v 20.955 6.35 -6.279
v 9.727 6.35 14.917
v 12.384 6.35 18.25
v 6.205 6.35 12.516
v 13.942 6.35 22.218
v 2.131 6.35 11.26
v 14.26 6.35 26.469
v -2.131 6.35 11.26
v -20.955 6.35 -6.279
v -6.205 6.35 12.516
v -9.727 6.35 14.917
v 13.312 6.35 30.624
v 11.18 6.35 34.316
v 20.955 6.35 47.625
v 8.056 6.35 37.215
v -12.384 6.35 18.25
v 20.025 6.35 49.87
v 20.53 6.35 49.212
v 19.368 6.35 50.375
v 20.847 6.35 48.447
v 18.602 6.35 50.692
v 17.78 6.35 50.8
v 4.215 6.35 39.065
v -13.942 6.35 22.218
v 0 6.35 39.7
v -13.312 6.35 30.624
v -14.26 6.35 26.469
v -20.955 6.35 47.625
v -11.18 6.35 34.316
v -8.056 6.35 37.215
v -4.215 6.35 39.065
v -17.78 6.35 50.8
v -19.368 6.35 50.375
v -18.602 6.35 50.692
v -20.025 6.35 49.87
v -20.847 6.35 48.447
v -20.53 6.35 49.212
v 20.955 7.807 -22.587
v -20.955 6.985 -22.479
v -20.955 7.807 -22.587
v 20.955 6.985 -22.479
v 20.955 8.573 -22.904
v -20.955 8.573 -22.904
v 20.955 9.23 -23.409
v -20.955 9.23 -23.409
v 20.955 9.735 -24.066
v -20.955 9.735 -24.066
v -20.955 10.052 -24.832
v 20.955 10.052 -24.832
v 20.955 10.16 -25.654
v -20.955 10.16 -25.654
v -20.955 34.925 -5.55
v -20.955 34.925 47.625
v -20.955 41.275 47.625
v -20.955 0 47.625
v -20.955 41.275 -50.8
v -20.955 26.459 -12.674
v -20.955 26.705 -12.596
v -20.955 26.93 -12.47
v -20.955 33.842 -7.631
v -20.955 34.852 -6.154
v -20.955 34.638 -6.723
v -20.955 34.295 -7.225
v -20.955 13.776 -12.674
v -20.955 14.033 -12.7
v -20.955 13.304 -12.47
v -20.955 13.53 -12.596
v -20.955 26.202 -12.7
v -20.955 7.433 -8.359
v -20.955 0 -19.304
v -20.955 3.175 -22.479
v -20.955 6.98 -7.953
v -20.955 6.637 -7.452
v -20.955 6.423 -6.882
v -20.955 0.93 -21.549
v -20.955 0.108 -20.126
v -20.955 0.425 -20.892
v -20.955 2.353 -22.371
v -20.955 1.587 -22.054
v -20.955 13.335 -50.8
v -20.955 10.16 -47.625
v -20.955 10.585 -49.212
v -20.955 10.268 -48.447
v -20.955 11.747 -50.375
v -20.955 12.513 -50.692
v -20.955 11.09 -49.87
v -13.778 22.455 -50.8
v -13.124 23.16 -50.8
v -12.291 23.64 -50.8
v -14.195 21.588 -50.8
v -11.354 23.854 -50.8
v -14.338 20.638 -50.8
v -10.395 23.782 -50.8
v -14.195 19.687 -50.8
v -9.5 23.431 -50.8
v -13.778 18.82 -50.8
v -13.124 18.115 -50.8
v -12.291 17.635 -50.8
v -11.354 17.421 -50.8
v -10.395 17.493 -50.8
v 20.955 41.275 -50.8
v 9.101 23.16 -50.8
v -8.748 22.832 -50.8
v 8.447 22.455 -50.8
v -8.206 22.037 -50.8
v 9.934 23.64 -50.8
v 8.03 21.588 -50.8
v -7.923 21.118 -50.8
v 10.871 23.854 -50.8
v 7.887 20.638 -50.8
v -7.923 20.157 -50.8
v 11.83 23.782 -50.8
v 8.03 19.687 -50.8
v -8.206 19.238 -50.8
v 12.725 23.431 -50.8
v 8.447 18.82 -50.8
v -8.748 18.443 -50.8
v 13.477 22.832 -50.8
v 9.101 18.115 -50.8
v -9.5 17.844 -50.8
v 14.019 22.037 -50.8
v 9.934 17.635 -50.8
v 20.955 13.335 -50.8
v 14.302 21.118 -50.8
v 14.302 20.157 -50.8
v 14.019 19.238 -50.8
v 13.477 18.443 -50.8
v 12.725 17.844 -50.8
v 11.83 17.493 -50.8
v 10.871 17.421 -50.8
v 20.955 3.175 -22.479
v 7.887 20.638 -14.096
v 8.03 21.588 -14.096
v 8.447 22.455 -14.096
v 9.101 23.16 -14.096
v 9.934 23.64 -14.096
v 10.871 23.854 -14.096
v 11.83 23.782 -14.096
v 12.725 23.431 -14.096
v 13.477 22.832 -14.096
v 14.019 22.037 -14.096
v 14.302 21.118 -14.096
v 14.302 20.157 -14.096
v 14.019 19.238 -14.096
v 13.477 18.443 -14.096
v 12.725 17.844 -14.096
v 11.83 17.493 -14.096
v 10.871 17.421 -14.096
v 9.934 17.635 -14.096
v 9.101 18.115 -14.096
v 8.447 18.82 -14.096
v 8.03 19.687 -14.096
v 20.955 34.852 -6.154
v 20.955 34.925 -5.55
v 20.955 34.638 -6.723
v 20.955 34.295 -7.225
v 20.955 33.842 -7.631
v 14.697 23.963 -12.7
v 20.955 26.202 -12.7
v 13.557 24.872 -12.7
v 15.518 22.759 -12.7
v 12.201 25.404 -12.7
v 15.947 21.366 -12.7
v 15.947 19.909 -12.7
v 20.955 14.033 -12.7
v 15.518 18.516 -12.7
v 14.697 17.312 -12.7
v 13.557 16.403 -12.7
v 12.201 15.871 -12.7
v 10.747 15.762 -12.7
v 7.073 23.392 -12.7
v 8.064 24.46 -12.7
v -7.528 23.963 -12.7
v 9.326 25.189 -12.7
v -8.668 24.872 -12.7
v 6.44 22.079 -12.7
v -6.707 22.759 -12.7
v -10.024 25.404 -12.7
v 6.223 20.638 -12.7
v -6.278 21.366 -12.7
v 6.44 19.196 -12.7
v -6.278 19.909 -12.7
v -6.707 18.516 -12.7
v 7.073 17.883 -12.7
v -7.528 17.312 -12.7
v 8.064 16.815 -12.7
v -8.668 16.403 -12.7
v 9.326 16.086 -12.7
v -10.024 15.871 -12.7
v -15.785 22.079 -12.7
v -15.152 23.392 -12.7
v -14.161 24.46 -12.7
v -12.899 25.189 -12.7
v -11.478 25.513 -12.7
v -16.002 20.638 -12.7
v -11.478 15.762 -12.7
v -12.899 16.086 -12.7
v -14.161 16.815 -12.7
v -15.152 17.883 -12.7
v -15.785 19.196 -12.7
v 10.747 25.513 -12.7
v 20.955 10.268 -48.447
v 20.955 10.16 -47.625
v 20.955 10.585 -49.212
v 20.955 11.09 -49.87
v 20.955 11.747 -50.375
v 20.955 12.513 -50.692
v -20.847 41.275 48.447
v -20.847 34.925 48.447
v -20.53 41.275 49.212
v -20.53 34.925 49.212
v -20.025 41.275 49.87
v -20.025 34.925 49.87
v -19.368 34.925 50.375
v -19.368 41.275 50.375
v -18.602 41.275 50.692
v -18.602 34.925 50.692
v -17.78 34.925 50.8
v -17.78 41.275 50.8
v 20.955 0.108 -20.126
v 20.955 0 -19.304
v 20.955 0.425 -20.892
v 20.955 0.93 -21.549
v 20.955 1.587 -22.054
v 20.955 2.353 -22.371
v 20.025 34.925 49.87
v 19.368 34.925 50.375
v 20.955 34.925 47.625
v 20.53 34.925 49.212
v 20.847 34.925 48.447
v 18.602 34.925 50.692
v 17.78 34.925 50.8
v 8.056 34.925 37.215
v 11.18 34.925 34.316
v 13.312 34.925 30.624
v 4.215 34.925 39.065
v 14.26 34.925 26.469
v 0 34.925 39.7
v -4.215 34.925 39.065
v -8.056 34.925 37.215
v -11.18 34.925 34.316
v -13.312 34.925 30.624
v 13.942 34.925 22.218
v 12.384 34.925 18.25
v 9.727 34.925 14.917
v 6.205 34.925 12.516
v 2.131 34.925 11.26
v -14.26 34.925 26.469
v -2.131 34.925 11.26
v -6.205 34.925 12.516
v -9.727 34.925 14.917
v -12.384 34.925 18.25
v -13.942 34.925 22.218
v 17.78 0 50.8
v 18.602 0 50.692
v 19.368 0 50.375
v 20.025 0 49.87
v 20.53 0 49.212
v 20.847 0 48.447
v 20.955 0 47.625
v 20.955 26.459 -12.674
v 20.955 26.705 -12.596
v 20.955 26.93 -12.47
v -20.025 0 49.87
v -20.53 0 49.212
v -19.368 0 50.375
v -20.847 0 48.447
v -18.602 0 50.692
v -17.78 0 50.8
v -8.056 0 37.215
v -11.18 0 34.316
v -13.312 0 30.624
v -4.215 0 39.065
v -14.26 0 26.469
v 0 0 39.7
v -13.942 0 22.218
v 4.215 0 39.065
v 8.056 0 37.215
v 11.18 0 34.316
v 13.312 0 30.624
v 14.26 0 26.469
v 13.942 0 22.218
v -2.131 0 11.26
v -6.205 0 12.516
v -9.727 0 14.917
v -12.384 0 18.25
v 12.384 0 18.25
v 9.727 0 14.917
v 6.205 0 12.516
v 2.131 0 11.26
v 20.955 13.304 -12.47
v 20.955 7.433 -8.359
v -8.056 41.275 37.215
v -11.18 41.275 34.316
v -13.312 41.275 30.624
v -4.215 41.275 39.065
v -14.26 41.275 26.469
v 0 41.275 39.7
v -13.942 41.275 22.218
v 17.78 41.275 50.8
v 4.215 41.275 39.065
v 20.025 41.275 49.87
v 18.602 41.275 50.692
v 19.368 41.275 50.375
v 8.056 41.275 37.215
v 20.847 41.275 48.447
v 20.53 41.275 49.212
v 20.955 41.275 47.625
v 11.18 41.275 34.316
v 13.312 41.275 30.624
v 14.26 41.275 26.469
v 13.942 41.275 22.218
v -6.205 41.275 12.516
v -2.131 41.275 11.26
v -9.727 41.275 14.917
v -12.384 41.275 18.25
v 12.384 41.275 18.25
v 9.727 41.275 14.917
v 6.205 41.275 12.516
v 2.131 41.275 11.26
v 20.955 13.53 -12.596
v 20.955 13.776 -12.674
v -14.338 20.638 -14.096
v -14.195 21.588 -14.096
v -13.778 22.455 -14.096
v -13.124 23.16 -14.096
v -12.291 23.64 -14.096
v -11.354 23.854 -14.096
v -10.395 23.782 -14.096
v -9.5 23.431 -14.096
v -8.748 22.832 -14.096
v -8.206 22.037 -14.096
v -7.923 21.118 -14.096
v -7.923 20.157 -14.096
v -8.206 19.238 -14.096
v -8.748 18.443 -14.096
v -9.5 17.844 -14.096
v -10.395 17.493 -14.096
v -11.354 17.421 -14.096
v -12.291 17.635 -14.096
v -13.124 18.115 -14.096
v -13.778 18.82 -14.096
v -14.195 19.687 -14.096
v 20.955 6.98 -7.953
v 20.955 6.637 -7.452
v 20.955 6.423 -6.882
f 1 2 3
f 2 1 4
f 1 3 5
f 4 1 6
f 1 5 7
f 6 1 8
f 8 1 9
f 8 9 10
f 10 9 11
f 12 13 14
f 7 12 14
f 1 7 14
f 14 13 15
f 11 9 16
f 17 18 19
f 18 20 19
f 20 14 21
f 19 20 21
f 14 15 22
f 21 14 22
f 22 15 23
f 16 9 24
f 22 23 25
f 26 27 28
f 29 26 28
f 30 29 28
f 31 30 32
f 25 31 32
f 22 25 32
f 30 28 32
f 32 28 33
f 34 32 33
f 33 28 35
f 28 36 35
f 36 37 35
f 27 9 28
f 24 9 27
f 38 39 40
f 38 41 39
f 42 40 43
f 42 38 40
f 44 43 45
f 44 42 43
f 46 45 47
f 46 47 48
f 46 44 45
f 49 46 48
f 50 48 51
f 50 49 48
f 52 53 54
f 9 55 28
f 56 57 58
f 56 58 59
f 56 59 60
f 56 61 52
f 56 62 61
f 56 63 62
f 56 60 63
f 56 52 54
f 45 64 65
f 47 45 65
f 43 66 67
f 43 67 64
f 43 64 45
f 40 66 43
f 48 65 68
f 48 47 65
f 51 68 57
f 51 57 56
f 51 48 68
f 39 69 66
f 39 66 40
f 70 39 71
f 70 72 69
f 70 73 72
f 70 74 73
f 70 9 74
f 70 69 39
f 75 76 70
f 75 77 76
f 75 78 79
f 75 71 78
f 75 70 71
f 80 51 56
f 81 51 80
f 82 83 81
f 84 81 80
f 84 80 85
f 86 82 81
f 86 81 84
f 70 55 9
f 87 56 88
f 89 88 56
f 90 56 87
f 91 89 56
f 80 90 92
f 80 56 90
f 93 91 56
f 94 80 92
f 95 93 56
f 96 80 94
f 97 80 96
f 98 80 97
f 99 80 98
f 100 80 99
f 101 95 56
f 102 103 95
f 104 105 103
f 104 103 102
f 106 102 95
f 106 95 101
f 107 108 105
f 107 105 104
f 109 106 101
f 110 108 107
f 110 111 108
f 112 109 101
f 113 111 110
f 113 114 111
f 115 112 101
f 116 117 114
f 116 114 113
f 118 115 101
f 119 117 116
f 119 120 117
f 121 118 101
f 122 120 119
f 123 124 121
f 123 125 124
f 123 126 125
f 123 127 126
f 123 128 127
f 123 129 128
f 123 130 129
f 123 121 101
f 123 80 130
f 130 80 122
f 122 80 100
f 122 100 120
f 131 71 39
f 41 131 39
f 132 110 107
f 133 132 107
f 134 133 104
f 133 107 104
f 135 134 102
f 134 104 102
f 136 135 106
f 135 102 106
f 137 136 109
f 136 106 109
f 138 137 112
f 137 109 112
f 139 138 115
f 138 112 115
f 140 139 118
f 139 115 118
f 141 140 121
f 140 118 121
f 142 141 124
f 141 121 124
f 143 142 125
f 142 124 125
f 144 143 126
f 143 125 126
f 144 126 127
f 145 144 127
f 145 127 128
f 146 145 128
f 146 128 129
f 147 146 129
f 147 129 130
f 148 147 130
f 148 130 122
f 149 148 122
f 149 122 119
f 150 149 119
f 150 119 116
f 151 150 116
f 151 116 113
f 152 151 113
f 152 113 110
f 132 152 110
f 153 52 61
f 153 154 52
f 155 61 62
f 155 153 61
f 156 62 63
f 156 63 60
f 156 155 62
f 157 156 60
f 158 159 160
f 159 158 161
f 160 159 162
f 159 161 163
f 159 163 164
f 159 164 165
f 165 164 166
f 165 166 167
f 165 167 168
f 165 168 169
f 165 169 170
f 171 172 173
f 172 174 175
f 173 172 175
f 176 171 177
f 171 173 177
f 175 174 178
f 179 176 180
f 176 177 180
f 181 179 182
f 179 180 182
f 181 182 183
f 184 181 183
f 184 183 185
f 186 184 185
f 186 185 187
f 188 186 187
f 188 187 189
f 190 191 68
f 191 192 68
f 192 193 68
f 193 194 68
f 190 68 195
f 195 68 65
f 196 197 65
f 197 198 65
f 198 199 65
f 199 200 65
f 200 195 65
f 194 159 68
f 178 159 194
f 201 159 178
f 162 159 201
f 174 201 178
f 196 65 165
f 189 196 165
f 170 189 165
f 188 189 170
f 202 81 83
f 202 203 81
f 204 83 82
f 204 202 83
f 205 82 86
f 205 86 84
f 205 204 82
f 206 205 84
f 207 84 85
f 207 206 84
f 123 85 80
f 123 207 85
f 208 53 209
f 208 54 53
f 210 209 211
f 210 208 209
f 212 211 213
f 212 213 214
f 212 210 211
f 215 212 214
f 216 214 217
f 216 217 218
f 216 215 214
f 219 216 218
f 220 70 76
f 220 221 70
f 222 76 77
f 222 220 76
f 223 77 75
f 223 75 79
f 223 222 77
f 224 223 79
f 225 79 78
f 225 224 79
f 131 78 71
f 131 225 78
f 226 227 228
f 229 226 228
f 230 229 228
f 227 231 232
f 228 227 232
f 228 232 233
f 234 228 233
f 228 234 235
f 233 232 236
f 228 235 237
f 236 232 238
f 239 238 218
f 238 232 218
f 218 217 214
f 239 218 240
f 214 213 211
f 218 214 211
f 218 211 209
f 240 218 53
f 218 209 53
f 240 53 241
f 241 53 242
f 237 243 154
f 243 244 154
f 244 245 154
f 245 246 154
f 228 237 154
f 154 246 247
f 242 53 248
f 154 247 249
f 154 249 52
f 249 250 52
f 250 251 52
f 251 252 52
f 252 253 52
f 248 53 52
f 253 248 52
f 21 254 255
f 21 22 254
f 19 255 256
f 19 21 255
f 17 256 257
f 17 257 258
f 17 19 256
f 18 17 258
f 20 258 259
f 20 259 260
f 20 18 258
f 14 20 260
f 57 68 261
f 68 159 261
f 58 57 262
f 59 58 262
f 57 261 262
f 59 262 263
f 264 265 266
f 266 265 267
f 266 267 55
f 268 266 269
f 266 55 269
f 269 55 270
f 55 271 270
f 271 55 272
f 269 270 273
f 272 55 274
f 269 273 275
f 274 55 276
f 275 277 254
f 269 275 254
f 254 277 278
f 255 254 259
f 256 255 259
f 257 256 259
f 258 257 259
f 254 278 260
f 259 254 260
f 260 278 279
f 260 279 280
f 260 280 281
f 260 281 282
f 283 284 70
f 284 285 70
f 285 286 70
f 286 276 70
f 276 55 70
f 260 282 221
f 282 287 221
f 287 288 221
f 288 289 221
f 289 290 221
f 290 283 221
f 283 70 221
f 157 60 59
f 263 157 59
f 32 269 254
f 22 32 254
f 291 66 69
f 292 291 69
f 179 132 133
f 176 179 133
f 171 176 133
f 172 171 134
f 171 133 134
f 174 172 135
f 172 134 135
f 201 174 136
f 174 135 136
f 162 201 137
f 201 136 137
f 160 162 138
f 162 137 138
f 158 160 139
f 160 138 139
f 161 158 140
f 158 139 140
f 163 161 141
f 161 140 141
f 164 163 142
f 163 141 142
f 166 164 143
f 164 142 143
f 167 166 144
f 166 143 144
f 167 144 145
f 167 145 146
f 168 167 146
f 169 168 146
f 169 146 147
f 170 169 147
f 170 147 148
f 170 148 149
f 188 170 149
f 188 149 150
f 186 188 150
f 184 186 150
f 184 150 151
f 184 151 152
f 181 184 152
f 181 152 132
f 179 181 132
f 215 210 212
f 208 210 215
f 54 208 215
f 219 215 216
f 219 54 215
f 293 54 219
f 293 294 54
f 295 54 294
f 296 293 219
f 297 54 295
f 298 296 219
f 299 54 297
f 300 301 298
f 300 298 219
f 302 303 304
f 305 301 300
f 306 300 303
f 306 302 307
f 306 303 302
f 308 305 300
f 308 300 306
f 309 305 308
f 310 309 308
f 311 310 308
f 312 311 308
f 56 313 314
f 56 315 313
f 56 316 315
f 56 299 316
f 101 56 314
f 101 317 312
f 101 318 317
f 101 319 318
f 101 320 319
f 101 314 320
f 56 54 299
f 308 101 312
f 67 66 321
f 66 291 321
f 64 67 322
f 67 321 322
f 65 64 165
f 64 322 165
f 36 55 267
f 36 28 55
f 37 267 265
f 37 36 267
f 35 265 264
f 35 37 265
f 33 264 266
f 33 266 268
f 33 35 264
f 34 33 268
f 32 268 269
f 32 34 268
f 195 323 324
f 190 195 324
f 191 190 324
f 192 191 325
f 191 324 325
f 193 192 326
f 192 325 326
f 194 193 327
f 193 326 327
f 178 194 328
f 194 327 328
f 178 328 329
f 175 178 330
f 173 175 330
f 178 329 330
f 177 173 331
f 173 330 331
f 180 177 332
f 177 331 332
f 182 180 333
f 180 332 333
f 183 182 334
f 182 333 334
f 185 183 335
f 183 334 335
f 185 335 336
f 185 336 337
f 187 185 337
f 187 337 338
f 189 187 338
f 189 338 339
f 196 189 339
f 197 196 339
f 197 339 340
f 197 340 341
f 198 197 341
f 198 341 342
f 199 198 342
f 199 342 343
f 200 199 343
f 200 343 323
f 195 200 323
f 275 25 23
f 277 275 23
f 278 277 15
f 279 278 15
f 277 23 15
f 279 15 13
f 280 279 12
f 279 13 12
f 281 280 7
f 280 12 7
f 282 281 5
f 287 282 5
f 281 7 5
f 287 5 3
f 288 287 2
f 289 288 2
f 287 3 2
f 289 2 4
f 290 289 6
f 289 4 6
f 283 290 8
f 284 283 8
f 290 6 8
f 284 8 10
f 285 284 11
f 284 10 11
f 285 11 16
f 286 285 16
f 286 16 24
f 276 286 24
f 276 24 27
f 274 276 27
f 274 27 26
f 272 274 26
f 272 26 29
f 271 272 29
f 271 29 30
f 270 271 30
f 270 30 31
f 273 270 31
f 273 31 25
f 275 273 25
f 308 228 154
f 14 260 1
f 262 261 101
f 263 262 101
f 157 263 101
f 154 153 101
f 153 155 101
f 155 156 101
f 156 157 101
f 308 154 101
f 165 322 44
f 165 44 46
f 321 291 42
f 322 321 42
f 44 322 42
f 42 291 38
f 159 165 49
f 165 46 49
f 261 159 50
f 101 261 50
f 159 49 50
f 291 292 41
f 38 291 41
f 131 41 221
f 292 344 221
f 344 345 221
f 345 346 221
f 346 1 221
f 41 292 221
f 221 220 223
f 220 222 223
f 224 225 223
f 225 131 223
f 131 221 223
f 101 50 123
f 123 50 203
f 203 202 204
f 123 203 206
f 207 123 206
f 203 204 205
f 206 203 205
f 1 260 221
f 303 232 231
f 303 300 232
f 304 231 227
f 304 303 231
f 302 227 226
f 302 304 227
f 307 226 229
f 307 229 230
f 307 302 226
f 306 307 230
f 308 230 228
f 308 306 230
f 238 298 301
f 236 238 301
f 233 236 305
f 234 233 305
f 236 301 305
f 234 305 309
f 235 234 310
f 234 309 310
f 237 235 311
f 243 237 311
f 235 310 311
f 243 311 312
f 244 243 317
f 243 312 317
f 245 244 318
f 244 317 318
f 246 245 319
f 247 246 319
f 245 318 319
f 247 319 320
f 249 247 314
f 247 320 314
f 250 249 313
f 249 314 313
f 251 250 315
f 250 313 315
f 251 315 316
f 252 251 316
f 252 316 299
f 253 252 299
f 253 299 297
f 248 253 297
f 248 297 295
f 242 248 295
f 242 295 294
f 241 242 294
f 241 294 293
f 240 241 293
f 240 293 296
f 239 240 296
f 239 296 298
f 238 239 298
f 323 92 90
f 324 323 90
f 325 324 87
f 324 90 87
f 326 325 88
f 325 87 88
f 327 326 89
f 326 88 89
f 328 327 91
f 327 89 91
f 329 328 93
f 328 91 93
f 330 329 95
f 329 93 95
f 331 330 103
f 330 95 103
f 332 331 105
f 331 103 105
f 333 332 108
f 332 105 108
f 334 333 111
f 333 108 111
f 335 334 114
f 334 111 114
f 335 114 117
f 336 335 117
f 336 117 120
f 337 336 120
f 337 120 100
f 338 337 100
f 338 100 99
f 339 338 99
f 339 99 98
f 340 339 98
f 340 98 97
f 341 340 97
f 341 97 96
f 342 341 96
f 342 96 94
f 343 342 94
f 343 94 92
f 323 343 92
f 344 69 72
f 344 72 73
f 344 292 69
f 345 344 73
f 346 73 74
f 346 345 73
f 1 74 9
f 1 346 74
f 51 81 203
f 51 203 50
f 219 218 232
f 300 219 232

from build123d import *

# Parameters (mm, degrees)
SKETCH1_W                                          = 41.91
SKETCH1_H                                          = 101.6
BOSS_EXTRUDE1_DEPTH                                = 41.275
CUT_EXTRUDE6_DEPTH                                 = 78.72202857
SKETCH3_R                                          = 14.3002
CUT_EXTRUDE2_DEPTH                                 = 69.726833551
SKETCH17_W                                         = 28.321
SKETCH17_H                                         = 10.16
CUT_EXTRUDE7_DEPTH                                 = 78.72202857
SKETCH4_R                                          = 3.2258
CUT_EXTRUDE3_DEPTH                                 = 112.648097386
FILLET2_R                                          = 3.175
CSK_FOR_10_FLAT_HEAD_MACHINE_SCREW_100_D           = 5.6134
CSK_FOR_10_FLAT_HEAD_MACHINE_SCREW_100_DEPTH       = 38.1
CSK_FOR_10_FLAT_HEAD_MACHINE_SCREW_100_CSINK_D     = 9.779
CSK_FOR_10_FLAT_HEAD_MACHINE_SCREW_100_CSINK_ANGLE = 100
CSK_FOR_10_FLAT_HEAD_MACHINE_SCREW_100_TIP         = 1.686435499
FILLET3_R                                          = 2.54
FILLET4_R                                          = 1.27


with BuildPart() as part:
    # Sketch1 → Boss-Extrude1 (new body)
    with BuildSketch(Plane(origin=(0, 0, 0), x_dir=(1, 0, 0), z_dir=(0, 1, 0))):
        Rectangle(SKETCH1_W, SKETCH1_H)
    extrude(amount=BOSS_EXTRUDE1_DEPTH)

    # Sketch13 → Cut-Extrude6 (cut, through all)
    with BuildSketch(Plane.ZY.offset(20.955)):
        Polygon((-6.872463407, 34.925), (-12.7, 26.60241523), (-12.7, 13.632261674), (-7.600905481, 6.35), (50.8, 6.35), (50.8, 34.925), align=None)
    extrude(amount=-CUT_EXTRUDE6_DEPTH, mode=Mode.SUBTRACT)

    # Sketch3 → Cut-Extrude2 (cut, through all)
    # profile 1 of 2: a face of its own
    with BuildSketch(Plane(origin=(0, 41.275, 0), x_dir=(1, 0, 0), z_dir=(0, 1, 0))):
        with Locations(Location((0, -25.4, 0), (0, 0, 270))):
            Circle(SKETCH3_R)
        Polygon((5.499261314, -25.4), (2.749630657, -20.6375), (-2.749630657, -20.6375), (-5.499261314, -25.4), (-2.749630657, -30.1625), (2.749630657, -30.1625), align=None, mode=Mode.SUBTRACT)
    # profile 2 of 2: a face of its own
    with BuildSketch(Plane(origin=(0, 41.275, 0), x_dir=(1, 0, 0), z_dir=(0, 1, 0))):
        Polygon((2.749630657, -30.1625), (5.499261314, -25.4), (2.749630657, -20.6375), (-2.749630657, -20.6375), (-5.499261314, -25.4), (-2.749630657, -30.1625), align=None)
    extrude(amount=-CUT_EXTRUDE2_DEPTH, mode=Mode.SUBTRACT)

    # Sketch17 → Cut-Extrude7 (cut, through all)
    with BuildSketch(Plane.ZY.offset(20.955)):
        with Locations((-36.6395, 5.08)):
            Rectangle(SKETCH17_W, SKETCH17_H)
    extrude(amount=-CUT_EXTRUDE7_DEPTH, mode=Mode.SUBTRACT)

    # Sketch4 → Cut-Extrude3 (cut, through all)
    with BuildSketch(Plane(origin=(0, 0, -50.8), x_dir=(-1, 0, 0), z_dir=(0, 0, -1))):
        with Locations((11.1125, 20.6375)):
            Circle(SKETCH4_R)
        with Locations((-11.1125, 20.6375)):
            Circle(SKETCH4_R)
    extrude(amount=-CUT_EXTRUDE3_DEPTH, mode=Mode.SUBTRACT)

    # Fillet2
    fillet2_edges = [part.edges().sort_by_distance(p)[0] for p in [
        (20.955, 3.175, 50.8),
        (-20.955, 3.175, 50.8),
        (0, 10.16, -50.8),
        (0, 10.16, -22.479),
        (0, 0, -22.479),
        (20.955, 38.1, 50.8),
        (-20.955, 38.1, 50.8),
    ]]
    fillet(fillet2_edges, radius=FILLET2_R)

    # CSK for #10 Flat Head Machine Screw (100)4
    with Locations(Plane.XY.offset(-12.7)):
        with Locations((-11.1125, 20.6375), (11.1125, 20.6375)):
            CounterSinkHole(CSK_FOR_10_FLAT_HEAD_MACHINE_SCREW_100_D / 2, CSK_FOR_10_FLAT_HEAD_MACHINE_SCREW_100_CSINK_D / 2, depth=CSK_FOR_10_FLAT_HEAD_MACHINE_SCREW_100_DEPTH, counter_sink_angle=CSK_FOR_10_FLAT_HEAD_MACHINE_SCREW_100_CSINK_ANGLE)
            with Locations((0, 0, -(CSK_FOR_10_FLAT_HEAD_MACHINE_SCREW_100_DEPTH + CSK_FOR_10_FLAT_HEAD_MACHINE_SCREW_100_TIP / 2))):  # 118° drill point
                Cone(0, CSK_FOR_10_FLAT_HEAD_MACHINE_SCREW_100_D / 2, CSK_FOR_10_FLAT_HEAD_MACHINE_SCREW_100_TIP, mode=Mode.SUBTRACT)

    # Fillet3
    fillet3_edges = [part.edges().sort_by_distance(p)[0] for p in [
        (0, 34.925, -6.872463407),
        (0, 6.35, -7.600905481),
    ]]
    fillet(fillet3_edges, radius=FILLET3_R)

    # Fillet4
    fillet4_edges = [part.edges().sort_by_distance(p)[0] for p in [
        (0, 13.632261674, -12.7),
        (0, 26.60241523, -12.7),
    ]]
    fillet(fillet4_edges, radius=FILLET4_R)


solid = part.part
